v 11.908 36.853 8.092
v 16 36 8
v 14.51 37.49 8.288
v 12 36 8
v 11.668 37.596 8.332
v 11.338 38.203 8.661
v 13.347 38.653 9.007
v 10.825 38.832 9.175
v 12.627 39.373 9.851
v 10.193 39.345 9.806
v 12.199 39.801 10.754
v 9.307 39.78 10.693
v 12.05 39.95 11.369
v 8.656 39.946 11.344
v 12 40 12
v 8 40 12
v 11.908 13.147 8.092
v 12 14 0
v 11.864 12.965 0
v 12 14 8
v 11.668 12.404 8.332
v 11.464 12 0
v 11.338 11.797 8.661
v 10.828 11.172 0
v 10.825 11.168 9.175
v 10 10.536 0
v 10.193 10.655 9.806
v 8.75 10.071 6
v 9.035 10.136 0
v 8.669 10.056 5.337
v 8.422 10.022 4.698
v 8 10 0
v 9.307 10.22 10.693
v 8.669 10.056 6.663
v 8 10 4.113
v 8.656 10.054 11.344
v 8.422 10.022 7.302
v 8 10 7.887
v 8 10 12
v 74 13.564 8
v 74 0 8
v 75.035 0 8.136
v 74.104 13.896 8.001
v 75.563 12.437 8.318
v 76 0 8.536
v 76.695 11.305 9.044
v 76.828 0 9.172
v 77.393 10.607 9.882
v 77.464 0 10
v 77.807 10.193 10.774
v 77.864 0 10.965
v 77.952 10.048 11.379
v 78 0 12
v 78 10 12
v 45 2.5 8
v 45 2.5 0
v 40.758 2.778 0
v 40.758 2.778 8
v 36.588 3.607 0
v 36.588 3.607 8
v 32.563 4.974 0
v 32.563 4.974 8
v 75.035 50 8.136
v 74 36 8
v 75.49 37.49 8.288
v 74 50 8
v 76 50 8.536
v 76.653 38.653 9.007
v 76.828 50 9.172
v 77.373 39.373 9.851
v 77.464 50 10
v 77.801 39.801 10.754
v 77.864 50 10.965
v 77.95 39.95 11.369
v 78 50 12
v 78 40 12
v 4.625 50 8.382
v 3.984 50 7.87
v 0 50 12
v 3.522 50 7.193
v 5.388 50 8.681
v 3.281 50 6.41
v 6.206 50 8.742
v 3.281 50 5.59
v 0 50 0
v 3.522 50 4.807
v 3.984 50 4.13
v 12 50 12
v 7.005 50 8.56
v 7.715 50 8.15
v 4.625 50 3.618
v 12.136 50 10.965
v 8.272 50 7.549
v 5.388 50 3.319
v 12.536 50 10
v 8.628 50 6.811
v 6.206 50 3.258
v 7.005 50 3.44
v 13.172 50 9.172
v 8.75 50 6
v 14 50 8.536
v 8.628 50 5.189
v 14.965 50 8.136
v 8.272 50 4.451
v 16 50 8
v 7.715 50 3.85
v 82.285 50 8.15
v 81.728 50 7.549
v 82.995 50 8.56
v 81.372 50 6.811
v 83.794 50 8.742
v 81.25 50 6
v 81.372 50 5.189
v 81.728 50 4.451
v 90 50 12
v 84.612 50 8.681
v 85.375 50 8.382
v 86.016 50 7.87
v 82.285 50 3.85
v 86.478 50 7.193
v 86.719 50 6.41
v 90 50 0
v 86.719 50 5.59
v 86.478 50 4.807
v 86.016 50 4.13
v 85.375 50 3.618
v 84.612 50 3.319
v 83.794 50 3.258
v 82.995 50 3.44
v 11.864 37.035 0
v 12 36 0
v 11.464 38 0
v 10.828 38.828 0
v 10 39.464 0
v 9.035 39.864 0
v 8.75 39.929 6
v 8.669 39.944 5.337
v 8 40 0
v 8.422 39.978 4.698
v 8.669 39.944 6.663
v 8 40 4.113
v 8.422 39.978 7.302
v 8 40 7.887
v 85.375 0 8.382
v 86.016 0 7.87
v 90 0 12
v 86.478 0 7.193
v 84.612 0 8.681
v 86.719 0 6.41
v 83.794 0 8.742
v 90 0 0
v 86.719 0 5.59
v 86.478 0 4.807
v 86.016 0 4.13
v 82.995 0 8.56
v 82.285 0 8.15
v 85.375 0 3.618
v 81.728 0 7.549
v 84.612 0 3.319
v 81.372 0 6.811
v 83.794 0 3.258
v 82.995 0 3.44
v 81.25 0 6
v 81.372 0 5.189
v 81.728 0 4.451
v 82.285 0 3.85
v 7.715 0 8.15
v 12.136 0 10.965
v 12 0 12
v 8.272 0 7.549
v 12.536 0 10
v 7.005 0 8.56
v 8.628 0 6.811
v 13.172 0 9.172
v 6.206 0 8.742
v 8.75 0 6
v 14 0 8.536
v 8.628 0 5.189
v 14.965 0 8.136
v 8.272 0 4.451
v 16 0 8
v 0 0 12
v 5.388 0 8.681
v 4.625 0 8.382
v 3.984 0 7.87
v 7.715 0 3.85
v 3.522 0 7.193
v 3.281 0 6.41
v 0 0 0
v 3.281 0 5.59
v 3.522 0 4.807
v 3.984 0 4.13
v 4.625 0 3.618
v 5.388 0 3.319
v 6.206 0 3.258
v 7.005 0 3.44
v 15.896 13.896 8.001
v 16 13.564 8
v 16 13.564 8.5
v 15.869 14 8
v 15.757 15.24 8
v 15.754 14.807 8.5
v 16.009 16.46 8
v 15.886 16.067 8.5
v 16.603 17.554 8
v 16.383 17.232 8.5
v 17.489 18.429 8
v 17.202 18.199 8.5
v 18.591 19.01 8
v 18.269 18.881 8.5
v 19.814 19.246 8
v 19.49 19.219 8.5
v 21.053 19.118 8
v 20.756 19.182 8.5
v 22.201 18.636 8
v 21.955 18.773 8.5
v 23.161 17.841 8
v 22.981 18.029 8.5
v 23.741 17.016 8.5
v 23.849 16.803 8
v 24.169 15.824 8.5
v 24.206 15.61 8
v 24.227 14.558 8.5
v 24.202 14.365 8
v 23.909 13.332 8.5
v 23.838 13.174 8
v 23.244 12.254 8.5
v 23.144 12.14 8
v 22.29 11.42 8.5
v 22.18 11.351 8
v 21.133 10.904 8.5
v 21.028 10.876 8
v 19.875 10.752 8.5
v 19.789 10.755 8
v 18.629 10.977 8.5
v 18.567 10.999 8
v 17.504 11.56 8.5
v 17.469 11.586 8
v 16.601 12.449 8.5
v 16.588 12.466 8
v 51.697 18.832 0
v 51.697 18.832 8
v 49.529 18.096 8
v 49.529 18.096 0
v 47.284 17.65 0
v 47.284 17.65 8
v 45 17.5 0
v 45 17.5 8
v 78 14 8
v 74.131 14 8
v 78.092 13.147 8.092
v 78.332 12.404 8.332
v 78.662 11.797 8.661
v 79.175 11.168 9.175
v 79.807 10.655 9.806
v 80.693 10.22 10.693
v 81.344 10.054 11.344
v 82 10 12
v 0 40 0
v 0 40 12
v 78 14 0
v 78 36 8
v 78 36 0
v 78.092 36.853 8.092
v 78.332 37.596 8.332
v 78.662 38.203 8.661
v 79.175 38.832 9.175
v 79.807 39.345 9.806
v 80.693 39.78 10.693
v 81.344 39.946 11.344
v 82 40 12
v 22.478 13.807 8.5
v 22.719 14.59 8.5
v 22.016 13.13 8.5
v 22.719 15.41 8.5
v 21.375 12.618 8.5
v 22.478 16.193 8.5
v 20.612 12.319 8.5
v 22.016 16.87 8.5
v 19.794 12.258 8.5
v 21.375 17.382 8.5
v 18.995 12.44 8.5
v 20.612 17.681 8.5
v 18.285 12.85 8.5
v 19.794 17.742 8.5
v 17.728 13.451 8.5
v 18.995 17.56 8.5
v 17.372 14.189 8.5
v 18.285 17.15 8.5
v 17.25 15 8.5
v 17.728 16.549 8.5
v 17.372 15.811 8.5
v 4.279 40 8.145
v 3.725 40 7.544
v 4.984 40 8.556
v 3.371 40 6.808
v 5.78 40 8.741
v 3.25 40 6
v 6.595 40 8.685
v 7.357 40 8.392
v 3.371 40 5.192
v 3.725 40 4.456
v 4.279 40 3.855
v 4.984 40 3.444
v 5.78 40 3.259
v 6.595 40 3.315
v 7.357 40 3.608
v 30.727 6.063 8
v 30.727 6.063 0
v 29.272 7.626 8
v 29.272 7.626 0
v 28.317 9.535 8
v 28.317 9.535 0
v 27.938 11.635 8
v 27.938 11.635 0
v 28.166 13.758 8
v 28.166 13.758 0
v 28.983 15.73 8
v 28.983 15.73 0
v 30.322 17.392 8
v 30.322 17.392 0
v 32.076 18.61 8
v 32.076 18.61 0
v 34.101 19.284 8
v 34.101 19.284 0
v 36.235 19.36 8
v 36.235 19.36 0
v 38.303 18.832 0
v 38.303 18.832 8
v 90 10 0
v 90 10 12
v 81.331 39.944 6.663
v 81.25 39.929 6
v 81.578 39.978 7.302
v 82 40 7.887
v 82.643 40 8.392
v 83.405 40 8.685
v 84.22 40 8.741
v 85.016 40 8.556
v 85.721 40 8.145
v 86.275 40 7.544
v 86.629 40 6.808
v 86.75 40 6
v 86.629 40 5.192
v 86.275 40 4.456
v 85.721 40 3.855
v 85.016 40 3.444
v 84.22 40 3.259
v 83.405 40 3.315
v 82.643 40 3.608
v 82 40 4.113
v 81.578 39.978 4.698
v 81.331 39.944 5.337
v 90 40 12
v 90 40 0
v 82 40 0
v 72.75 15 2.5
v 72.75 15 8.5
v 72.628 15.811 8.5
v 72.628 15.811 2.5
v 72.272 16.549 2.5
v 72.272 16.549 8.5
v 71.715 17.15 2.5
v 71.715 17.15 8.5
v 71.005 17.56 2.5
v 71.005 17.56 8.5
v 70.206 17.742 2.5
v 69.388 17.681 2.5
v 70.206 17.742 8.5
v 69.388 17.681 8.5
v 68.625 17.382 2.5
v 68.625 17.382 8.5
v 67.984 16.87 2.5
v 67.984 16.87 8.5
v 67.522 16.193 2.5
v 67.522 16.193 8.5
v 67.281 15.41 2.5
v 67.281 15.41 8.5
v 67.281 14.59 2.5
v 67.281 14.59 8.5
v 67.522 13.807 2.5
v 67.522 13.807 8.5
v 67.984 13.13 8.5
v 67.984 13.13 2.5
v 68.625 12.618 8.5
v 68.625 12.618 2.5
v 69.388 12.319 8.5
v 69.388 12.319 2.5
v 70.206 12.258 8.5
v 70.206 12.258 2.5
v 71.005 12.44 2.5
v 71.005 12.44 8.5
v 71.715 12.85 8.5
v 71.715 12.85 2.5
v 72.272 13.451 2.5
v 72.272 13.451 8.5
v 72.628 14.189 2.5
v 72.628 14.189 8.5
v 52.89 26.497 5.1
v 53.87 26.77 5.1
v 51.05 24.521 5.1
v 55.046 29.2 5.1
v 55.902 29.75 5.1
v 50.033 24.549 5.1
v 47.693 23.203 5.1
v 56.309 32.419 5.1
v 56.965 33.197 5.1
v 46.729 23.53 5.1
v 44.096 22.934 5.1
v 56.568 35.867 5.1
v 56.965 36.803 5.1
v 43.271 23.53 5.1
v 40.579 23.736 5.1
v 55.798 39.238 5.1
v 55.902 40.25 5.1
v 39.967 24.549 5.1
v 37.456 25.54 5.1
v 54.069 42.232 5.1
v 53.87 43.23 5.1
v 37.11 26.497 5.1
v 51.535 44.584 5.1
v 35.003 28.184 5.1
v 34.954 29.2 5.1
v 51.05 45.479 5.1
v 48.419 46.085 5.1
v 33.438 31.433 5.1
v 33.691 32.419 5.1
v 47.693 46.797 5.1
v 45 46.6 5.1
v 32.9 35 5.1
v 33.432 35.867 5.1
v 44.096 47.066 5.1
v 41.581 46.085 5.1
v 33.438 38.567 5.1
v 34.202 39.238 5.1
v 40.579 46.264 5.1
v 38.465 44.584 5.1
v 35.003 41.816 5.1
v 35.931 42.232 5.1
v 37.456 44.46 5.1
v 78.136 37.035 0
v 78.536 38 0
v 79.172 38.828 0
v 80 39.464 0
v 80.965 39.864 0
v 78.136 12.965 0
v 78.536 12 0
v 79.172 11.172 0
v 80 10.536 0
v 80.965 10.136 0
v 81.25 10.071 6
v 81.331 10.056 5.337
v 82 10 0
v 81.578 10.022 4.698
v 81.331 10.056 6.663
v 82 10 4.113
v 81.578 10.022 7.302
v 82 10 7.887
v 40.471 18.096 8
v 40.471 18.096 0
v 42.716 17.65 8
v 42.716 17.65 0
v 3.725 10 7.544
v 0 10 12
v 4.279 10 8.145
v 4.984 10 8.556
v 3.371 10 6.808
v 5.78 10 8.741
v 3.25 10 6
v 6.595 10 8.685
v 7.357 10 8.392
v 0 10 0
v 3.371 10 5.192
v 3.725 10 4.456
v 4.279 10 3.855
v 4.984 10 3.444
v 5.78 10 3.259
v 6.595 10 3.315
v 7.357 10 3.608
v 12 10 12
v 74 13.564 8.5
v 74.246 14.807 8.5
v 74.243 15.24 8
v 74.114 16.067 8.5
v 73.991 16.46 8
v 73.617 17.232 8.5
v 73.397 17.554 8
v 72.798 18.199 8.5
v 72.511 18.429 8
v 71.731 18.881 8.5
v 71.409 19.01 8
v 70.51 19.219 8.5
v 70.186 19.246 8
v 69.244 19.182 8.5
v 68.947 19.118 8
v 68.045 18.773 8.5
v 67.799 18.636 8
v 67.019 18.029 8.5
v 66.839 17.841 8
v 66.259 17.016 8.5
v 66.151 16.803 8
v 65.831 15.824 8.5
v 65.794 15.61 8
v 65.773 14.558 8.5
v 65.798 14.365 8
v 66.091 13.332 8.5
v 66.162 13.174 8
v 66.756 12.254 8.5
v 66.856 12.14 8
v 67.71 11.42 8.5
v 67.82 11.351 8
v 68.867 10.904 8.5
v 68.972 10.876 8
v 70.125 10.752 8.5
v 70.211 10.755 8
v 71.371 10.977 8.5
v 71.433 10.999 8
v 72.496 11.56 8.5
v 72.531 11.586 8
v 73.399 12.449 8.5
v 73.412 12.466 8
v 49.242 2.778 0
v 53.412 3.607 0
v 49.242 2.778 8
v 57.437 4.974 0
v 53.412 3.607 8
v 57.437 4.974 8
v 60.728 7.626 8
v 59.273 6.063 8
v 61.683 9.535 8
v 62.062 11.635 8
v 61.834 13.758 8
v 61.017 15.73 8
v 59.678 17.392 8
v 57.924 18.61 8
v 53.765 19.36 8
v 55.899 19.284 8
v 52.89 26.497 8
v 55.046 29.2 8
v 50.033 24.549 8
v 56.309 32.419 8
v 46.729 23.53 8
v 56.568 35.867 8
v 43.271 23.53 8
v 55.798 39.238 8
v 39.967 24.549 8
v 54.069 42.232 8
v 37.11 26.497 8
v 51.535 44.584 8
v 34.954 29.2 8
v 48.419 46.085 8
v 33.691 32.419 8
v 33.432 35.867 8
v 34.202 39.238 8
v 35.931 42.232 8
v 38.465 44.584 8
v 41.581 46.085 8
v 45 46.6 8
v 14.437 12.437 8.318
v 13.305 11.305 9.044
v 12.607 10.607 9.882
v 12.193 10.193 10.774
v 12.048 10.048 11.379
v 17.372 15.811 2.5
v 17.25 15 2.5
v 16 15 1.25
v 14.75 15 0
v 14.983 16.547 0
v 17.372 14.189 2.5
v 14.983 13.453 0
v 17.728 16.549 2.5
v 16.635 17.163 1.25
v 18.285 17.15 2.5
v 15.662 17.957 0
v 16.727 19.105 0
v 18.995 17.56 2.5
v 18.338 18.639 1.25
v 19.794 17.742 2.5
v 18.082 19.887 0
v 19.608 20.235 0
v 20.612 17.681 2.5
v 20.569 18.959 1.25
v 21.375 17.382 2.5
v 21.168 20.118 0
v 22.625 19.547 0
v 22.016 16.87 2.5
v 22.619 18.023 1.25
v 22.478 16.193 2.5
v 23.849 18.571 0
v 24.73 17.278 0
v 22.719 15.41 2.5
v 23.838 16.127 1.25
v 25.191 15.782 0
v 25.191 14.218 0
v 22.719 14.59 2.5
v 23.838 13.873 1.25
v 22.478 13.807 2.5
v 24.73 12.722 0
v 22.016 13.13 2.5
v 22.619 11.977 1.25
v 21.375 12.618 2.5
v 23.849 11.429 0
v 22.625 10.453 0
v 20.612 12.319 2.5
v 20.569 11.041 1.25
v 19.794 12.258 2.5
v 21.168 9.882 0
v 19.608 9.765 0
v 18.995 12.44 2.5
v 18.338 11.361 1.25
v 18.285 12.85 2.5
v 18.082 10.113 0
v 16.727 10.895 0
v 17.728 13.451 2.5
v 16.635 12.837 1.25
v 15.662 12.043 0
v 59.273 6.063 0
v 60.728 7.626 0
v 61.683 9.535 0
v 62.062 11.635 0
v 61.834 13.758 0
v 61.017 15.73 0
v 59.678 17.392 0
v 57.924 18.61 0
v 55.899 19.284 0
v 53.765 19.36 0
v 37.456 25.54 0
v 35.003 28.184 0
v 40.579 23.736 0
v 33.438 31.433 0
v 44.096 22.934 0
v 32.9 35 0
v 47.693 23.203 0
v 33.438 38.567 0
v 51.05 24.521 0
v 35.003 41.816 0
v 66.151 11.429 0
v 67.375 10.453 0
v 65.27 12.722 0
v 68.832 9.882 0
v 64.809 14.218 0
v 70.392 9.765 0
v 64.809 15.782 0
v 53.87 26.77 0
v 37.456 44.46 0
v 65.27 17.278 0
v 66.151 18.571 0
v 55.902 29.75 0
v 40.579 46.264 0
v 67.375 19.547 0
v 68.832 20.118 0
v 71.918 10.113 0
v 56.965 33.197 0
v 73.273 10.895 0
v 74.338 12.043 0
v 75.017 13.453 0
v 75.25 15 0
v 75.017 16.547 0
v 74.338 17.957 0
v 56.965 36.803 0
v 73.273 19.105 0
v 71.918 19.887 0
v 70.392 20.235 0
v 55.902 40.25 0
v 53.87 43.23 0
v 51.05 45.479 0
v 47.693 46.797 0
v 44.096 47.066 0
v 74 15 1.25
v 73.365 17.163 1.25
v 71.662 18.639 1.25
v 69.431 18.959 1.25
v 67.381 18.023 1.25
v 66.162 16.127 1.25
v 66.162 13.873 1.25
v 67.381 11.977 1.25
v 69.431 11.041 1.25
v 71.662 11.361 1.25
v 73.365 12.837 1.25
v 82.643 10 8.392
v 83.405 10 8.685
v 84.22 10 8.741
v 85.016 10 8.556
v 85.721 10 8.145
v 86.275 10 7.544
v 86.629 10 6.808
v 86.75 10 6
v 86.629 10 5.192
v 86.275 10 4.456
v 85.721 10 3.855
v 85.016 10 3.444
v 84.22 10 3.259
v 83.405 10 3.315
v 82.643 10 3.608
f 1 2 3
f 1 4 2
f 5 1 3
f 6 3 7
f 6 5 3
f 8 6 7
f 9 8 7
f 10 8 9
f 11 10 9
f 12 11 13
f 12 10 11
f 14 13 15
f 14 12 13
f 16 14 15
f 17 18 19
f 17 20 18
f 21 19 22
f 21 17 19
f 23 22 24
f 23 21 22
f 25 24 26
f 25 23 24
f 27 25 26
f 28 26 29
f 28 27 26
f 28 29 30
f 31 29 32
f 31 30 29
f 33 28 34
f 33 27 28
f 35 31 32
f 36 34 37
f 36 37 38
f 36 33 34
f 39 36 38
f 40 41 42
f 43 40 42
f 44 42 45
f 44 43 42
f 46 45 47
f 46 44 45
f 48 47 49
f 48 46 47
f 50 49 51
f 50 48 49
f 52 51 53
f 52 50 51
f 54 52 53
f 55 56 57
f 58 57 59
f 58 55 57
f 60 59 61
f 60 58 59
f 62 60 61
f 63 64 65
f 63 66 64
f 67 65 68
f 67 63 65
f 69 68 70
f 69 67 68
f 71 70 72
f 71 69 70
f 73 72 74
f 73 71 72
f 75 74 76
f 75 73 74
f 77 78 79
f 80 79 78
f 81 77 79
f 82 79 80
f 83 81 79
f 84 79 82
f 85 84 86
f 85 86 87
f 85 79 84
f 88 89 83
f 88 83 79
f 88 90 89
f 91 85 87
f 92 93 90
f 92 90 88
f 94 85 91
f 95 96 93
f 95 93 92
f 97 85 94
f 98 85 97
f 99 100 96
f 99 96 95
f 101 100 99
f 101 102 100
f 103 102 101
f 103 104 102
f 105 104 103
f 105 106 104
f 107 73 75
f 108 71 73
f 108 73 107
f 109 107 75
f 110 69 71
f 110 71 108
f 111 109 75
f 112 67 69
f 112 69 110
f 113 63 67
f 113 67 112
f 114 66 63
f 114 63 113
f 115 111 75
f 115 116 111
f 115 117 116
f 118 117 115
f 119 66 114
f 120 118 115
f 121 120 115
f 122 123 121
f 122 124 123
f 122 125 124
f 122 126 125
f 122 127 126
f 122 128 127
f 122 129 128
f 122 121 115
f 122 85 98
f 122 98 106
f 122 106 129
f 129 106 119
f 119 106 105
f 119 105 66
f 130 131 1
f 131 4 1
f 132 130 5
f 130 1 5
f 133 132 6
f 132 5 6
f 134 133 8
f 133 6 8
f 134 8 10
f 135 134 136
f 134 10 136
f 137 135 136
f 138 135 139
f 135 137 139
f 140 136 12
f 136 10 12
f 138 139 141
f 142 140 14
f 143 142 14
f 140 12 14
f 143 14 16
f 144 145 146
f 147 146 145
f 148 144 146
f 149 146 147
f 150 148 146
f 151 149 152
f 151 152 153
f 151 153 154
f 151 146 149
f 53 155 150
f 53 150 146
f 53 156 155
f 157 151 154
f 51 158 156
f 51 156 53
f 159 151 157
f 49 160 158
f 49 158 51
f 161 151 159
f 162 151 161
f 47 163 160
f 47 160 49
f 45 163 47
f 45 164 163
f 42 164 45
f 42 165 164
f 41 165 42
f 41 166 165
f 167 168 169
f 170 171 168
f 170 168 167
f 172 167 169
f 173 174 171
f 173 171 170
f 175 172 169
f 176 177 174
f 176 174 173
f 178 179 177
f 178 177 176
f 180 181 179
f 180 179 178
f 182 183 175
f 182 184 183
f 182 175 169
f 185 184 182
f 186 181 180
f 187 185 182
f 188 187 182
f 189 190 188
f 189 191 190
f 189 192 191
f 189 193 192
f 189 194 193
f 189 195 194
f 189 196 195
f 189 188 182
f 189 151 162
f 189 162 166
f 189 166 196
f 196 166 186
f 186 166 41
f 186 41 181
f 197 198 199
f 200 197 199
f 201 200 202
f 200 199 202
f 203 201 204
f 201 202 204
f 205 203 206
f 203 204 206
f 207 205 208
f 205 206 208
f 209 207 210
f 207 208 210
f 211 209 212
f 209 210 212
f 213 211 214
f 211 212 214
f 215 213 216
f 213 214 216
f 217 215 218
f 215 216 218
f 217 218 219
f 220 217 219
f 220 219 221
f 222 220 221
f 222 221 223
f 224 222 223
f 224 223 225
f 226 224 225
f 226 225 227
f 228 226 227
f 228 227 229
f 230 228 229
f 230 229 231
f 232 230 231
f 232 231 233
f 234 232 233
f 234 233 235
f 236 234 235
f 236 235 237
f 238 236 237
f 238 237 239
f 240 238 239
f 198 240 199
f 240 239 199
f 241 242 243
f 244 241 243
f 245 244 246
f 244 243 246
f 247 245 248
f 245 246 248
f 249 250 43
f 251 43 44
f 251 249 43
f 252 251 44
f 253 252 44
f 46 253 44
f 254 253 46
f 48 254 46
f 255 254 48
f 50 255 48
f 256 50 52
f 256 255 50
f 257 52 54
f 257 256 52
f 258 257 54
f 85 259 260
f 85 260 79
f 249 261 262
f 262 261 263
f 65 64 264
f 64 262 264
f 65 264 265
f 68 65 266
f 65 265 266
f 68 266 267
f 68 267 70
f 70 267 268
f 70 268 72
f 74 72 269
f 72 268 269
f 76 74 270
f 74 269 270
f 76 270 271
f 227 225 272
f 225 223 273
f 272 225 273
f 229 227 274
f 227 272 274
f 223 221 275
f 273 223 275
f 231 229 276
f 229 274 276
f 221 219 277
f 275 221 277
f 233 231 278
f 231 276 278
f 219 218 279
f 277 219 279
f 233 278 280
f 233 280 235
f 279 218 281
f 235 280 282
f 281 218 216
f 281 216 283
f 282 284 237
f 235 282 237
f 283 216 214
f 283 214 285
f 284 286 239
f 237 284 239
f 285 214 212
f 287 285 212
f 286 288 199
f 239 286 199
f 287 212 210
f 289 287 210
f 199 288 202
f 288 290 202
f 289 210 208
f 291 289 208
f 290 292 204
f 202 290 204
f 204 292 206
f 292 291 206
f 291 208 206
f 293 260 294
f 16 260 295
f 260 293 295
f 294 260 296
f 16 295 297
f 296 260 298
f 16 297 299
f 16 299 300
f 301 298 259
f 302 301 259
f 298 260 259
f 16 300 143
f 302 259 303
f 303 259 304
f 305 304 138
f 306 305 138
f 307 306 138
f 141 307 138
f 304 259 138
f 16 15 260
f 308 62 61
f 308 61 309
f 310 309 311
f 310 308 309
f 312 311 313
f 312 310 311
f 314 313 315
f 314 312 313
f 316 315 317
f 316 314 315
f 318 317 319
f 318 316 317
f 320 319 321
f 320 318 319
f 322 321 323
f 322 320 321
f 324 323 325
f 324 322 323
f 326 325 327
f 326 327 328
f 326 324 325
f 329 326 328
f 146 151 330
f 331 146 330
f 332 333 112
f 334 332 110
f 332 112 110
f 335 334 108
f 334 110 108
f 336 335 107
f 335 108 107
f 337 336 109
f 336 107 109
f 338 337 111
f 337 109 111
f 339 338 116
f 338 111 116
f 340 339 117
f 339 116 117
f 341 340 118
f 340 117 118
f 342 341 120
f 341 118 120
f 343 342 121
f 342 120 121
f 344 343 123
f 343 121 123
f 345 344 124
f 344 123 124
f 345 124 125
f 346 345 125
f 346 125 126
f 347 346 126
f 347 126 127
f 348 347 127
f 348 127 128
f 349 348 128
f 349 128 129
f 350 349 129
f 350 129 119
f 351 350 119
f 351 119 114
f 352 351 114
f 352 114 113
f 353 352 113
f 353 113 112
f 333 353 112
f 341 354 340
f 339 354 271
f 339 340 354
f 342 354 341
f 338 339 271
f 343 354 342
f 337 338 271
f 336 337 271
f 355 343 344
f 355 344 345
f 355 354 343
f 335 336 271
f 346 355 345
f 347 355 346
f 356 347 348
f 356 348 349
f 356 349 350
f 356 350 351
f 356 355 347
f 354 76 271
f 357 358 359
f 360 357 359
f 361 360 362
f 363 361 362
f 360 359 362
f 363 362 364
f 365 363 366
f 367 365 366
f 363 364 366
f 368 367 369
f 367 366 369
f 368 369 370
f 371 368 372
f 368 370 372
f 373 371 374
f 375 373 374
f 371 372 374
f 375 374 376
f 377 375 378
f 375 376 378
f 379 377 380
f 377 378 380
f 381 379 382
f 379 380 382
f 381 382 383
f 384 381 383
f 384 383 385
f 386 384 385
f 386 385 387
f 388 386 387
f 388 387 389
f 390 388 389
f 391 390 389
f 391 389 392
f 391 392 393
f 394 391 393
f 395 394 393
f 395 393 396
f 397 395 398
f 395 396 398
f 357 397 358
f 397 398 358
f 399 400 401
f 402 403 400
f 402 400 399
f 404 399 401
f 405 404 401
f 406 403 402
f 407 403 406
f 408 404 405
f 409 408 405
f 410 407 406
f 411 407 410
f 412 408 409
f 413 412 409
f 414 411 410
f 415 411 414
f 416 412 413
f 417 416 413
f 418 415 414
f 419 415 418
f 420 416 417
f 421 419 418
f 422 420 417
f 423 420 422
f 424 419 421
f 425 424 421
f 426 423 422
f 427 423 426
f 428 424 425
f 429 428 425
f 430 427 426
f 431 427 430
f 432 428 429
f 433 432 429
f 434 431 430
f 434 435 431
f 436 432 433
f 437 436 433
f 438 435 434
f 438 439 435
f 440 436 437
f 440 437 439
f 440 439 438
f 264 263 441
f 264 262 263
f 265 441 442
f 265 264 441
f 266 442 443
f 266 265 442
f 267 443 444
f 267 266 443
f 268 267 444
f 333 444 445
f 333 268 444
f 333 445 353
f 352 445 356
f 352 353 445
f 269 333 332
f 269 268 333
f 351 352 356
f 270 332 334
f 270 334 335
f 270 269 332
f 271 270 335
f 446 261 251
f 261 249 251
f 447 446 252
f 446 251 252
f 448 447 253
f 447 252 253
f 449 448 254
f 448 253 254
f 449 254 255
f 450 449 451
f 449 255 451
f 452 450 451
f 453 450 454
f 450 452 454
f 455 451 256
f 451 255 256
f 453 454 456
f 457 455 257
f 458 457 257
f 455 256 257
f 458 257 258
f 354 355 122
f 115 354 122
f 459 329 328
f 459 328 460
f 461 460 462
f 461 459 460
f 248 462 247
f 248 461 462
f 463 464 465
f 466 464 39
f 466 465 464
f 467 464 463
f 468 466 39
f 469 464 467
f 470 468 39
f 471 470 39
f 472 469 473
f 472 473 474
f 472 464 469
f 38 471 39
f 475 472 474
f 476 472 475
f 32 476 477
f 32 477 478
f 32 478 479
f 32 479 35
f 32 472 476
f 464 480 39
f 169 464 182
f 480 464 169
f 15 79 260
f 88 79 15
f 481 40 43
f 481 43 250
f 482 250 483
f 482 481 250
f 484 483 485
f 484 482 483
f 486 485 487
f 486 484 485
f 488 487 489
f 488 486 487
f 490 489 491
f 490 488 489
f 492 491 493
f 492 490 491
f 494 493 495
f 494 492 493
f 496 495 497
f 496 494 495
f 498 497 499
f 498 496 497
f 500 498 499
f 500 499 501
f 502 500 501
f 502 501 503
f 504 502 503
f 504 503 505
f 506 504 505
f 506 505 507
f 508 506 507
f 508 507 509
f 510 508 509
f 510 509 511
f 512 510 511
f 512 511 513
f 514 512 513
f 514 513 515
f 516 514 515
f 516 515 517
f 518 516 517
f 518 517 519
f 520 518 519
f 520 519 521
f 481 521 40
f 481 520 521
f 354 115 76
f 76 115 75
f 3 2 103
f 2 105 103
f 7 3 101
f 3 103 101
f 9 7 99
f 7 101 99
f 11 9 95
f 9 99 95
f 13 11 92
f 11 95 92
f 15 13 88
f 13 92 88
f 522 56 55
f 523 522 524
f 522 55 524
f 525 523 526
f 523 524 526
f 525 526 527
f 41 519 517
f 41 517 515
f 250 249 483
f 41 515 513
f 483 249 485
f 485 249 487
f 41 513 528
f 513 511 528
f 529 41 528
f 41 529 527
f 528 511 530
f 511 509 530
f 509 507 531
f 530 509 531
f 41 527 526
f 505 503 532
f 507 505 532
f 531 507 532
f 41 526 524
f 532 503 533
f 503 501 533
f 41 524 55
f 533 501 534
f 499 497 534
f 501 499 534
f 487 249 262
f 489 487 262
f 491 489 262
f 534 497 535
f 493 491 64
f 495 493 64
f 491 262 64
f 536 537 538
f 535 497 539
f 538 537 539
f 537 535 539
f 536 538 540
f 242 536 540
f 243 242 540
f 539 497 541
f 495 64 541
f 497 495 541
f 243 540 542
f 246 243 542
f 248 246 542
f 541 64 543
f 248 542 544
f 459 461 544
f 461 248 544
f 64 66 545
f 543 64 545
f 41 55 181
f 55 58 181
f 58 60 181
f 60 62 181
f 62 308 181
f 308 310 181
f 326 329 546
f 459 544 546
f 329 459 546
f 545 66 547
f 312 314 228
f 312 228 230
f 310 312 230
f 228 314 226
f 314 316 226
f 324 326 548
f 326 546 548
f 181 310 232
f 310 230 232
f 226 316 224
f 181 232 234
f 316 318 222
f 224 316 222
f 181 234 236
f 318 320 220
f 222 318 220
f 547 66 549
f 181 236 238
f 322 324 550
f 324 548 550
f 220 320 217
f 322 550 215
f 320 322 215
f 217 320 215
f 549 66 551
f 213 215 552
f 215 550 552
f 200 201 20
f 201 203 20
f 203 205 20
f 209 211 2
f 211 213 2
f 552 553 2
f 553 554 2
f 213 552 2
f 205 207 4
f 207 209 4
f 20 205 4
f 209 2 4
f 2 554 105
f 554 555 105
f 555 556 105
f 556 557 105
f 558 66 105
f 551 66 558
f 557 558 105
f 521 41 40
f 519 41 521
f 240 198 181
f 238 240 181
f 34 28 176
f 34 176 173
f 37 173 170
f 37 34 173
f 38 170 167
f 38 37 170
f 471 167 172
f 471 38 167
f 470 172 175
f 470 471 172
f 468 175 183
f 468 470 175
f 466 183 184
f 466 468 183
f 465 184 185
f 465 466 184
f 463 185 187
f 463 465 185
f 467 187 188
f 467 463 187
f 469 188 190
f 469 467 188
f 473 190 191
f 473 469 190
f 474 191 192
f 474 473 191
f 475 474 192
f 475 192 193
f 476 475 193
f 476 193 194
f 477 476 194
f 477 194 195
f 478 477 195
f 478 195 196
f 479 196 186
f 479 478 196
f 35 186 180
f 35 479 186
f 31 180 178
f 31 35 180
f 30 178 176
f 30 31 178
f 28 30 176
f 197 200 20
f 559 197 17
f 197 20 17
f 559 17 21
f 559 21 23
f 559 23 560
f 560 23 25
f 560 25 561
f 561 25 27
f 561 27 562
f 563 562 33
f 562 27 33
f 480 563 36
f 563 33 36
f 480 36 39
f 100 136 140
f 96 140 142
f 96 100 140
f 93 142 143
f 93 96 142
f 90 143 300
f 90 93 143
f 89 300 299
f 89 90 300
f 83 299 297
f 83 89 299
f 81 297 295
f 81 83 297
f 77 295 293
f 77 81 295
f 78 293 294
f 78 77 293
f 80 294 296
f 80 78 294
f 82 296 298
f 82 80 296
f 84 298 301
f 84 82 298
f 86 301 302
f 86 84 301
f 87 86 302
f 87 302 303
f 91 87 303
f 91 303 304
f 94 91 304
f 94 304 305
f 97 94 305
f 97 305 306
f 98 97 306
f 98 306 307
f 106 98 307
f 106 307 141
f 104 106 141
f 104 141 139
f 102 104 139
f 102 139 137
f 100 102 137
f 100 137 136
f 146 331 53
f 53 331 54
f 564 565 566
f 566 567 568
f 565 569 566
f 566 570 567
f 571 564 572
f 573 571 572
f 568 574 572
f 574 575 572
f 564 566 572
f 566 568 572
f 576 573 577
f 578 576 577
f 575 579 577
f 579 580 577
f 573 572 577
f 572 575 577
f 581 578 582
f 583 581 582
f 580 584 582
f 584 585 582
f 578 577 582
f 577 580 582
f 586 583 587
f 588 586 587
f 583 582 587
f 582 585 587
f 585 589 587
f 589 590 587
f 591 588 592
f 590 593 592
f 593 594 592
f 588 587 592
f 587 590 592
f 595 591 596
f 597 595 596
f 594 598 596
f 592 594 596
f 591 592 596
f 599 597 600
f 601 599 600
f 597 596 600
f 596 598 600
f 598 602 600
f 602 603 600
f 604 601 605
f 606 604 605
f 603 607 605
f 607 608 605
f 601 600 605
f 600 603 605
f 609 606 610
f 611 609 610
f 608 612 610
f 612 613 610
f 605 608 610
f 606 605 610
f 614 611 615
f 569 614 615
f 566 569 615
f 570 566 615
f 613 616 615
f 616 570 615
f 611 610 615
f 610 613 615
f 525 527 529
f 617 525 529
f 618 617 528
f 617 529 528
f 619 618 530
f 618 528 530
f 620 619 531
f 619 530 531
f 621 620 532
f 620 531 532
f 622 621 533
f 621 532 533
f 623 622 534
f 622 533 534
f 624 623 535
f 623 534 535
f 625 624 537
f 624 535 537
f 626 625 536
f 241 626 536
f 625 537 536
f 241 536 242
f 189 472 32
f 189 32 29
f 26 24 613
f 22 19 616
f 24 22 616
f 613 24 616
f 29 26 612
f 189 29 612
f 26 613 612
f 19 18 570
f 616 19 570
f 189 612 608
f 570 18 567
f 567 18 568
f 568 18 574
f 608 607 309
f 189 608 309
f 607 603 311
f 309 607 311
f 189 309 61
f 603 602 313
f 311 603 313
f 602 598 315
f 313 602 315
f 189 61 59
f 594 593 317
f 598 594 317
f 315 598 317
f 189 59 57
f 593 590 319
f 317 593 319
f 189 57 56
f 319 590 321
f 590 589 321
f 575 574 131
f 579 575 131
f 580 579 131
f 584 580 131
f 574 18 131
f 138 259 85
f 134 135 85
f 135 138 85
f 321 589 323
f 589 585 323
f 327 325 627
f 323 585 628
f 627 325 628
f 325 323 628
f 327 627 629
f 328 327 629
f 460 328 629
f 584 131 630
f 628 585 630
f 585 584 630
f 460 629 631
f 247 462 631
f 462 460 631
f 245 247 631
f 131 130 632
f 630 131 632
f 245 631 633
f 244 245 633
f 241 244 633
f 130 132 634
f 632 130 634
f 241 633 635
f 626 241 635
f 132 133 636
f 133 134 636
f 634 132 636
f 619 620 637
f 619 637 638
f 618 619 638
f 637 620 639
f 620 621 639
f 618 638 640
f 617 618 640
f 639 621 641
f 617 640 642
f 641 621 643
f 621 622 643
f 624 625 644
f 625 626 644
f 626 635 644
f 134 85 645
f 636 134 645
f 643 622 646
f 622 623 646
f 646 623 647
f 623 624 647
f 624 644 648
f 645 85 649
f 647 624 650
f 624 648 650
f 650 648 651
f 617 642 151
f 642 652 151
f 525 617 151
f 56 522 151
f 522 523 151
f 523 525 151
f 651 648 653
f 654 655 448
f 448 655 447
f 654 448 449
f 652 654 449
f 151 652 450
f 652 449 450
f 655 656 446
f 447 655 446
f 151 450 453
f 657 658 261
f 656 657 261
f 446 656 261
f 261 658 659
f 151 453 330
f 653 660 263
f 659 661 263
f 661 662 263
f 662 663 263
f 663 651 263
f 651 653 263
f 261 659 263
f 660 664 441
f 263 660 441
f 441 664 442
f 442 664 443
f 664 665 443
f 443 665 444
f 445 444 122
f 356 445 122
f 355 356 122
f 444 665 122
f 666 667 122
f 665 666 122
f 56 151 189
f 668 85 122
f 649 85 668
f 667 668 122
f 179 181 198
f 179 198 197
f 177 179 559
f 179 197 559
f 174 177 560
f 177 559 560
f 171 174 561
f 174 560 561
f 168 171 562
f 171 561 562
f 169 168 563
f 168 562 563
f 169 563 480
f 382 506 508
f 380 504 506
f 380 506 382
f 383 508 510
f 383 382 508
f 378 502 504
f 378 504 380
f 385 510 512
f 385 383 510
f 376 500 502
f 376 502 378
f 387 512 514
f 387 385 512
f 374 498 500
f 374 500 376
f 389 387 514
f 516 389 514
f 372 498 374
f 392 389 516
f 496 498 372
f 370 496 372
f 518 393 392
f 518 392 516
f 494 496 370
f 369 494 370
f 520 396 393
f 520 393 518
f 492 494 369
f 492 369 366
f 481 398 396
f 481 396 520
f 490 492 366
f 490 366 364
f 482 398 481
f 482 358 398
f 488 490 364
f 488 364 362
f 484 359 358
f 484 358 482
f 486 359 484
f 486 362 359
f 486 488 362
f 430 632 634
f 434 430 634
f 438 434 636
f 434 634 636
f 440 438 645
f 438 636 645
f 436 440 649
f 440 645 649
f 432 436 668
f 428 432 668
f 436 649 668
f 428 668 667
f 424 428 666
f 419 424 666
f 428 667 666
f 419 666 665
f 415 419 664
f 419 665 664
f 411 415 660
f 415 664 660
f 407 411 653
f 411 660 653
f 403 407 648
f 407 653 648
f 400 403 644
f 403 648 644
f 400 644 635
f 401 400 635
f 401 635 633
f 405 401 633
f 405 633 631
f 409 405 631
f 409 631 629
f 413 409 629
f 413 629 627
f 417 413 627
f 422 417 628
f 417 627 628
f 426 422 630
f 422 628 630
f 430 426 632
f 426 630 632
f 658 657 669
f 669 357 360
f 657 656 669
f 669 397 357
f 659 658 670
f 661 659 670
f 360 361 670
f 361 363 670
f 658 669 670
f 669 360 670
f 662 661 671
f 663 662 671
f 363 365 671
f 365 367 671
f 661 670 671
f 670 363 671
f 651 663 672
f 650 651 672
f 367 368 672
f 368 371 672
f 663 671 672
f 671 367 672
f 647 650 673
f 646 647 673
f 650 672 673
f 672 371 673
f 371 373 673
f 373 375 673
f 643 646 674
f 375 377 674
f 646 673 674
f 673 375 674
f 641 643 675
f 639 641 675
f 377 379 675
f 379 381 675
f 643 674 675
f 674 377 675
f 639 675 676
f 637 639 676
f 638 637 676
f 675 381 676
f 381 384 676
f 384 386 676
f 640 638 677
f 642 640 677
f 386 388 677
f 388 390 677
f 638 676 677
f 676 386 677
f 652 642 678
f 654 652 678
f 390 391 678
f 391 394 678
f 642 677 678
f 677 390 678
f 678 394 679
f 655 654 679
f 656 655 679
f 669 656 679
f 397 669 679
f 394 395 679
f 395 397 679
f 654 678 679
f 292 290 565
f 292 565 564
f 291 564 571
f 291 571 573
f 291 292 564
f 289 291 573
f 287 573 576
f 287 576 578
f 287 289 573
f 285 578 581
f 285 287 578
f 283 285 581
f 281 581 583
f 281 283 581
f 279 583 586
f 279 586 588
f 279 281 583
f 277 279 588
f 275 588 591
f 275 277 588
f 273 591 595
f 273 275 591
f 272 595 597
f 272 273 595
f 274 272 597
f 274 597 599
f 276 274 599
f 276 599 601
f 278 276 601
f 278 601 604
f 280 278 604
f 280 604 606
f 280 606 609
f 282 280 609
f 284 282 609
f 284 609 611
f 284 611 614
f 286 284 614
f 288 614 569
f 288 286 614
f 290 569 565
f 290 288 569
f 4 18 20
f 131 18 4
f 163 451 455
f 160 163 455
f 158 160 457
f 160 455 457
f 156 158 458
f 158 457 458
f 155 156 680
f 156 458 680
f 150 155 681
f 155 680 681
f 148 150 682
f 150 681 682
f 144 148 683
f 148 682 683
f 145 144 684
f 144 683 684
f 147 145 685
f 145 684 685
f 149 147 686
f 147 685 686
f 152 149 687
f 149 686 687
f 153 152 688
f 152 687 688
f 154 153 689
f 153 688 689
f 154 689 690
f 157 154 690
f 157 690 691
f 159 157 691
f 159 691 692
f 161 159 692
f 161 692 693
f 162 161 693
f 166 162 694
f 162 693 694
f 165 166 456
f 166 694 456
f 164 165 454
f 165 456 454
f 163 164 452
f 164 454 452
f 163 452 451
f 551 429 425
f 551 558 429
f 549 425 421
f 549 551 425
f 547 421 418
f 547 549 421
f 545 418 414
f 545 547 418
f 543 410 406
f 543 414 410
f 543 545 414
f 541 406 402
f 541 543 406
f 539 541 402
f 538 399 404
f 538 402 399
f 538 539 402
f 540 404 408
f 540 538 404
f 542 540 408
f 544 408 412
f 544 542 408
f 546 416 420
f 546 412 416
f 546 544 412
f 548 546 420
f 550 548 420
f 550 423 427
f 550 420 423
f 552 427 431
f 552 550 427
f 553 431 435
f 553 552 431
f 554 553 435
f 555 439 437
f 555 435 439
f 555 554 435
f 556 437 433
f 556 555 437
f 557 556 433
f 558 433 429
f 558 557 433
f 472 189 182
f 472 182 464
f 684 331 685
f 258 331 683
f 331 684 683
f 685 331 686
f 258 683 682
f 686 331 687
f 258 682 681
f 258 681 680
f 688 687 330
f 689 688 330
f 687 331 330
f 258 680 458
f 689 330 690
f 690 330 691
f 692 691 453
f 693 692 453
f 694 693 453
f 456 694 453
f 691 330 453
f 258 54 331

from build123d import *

# Parameters (mm, degrees)
SKETCH1_W           = 33
SKETCH1_H           = 50
BOSS_EXTRUDE1_DEPTH = 8
SKETCH2_W           = 12
SKETCH2_H           = 10
BOSS_EXTRUDE2_DEPTH = 12
FILLET1_R           = 4
FILLET2_R           = 4
SKETCH3_R           = 2.75
SKETCH3_R_2         = 11.6
CUT_EXTRUDE1_DEPTH  = 104.266645155
BOSS_EXTRUDE3_START = 0.5
SKETCH4_R           = 4.25
SKETCH4_R_2         = 2.75
BOSS_EXTRUDE3_DEPTH = 0.5
SKETCH7_R           = 2.75
CUT_EXTRUDE3_DEPTH  = 104.653268207
SKETCH6_R           = 12.1
CUT_EXTRUDE2_DEPTH  = 5.1
CHAMFER1_SIZE       = 2.5


with BuildPart() as part:
    # Sketch1 → Boss-Extrude1 (new body)
    with BuildSketch(Plane.XY):
        with Locations((61.5, 25)):
            Rectangle(SKETCH1_W, SKETCH1_H)
    extrude(amount=BOSS_EXTRUDE1_DEPTH)

    # Sketch2 → Boss-Extrude2 (add)
    with BuildSketch(Plane(origin=(0, 0, 0), x_dir=(-1, 0, 0), z_dir=(0, 0, -1))):
        with Locations((-84, 45)):
            Rectangle(SKETCH2_W, SKETCH2_H)
        with Locations((-84, 5)):
            Rectangle(SKETCH2_W, SKETCH2_H)
    extrude(amount=-BOSS_EXTRUDE2_DEPTH)

    # Fillet1
    fillet1_edges = [part.edges().sort_by_distance(p)[0] for p in [
        (78, 40, 4),
        (78, 10, 4),
    ]]
    fillet(fillet1_edges, radius=FILLET1_R)

    # Fillet2
    fillet2_edges = [part.edges().sort_by_distance(p)[0] for p in [
        (78, 5, 8),
        (80, 10, 8),
        (78, 45, 8),
        (80, 40, 8),
    ]]
    fillet(fillet2_edges, radius=FILLET2_R - 0.0001)  # a hair under: the kernel refuses the full size

    # Sketch3 → Cut-Extrude1 (cut, through all)
    with BuildSketch(Plane.XY.offset(8)):
        with Locations((69.99999756, 15.000000247)):
            Circle(SKETCH3_R)
        with Locations((45, 35)):
            Circle(SKETCH3_R_2)
        with BuildLine():
            Line((27.5, 35), (12.5, 35))
            ThreePointArc((12.5, 35), (26.943967427, 7.9772376), (57.437211552, 4.973915193))
            ThreePointArc((57.437211552, 4.973915193), (61.496182303, 14.77313743), (51.696960066, 18.832108181))
            ThreePointArc((51.696960066, 18.832108181), (35.277520922, 20.449281785), (27.5, 35))
        make_face()
    extrude(amount=-CUT_EXTRUDE1_DEPTH, mode=Mode.SUBTRACT)

    # Sketch4 → Boss-Extrude3 (add)
    with BuildSketch(Plane.XY.offset(8).offset(BOSS_EXTRUDE3_START)):
        with Locations(Location((69.99999756, 15.000000247, 0), (0, 0, 340.25017454))):
            Circle(SKETCH4_R)
        with Locations((69.99999756, 15.000000247)):
            Circle(SKETCH4_R_2, mode=Mode.SUBTRACT)
    extrude(amount=-BOSS_EXTRUDE3_DEPTH)

    # Sketch7 → Cut-Extrude3 (cut, through all)
    with BuildSketch(Plane(origin=(0, 50, 0), x_dir=(1, 0, 0), z_dir=(0, 1, 0))):
        with Locations(Location((84, -6, 0), (0, 0, 180))):
            Circle(SKETCH7_R)
    extrude(amount=-CUT_EXTRUDE3_DEPTH, mode=Mode.SUBTRACT)

    # Mirror1: part across plane


with BuildPart() as part_1:
    add(part.part)
    add(part.part.mirror(Plane(origin=(45, 50, 8), x_dir=(0, 0, 1), z_dir=(1, 0, 0))))

    # Sketch6 → Cut-Extrude2 (cut)
    with BuildSketch(Plane(origin=(0, 0, 0), x_dir=(-1, 0, 0), z_dir=(0, 0, -1))):
        with Locations((-45, 35)):
            Circle(SKETCH6_R)
    extrude(amount=-CUT_EXTRUDE2_DEPTH, mode=Mode.SUBTRACT)

    # Chamfer1
    chamfer1_edges = [part_1.edges().sort_by_distance(p)[0] for p in [
        (22.75000244, 15.000000247, 0),
        (67.24999756, 15.000000247, 0),
    ]]
    chamfer(chamfer1_edges, length=CHAMFER1_SIZE)


solid = part_1.part
